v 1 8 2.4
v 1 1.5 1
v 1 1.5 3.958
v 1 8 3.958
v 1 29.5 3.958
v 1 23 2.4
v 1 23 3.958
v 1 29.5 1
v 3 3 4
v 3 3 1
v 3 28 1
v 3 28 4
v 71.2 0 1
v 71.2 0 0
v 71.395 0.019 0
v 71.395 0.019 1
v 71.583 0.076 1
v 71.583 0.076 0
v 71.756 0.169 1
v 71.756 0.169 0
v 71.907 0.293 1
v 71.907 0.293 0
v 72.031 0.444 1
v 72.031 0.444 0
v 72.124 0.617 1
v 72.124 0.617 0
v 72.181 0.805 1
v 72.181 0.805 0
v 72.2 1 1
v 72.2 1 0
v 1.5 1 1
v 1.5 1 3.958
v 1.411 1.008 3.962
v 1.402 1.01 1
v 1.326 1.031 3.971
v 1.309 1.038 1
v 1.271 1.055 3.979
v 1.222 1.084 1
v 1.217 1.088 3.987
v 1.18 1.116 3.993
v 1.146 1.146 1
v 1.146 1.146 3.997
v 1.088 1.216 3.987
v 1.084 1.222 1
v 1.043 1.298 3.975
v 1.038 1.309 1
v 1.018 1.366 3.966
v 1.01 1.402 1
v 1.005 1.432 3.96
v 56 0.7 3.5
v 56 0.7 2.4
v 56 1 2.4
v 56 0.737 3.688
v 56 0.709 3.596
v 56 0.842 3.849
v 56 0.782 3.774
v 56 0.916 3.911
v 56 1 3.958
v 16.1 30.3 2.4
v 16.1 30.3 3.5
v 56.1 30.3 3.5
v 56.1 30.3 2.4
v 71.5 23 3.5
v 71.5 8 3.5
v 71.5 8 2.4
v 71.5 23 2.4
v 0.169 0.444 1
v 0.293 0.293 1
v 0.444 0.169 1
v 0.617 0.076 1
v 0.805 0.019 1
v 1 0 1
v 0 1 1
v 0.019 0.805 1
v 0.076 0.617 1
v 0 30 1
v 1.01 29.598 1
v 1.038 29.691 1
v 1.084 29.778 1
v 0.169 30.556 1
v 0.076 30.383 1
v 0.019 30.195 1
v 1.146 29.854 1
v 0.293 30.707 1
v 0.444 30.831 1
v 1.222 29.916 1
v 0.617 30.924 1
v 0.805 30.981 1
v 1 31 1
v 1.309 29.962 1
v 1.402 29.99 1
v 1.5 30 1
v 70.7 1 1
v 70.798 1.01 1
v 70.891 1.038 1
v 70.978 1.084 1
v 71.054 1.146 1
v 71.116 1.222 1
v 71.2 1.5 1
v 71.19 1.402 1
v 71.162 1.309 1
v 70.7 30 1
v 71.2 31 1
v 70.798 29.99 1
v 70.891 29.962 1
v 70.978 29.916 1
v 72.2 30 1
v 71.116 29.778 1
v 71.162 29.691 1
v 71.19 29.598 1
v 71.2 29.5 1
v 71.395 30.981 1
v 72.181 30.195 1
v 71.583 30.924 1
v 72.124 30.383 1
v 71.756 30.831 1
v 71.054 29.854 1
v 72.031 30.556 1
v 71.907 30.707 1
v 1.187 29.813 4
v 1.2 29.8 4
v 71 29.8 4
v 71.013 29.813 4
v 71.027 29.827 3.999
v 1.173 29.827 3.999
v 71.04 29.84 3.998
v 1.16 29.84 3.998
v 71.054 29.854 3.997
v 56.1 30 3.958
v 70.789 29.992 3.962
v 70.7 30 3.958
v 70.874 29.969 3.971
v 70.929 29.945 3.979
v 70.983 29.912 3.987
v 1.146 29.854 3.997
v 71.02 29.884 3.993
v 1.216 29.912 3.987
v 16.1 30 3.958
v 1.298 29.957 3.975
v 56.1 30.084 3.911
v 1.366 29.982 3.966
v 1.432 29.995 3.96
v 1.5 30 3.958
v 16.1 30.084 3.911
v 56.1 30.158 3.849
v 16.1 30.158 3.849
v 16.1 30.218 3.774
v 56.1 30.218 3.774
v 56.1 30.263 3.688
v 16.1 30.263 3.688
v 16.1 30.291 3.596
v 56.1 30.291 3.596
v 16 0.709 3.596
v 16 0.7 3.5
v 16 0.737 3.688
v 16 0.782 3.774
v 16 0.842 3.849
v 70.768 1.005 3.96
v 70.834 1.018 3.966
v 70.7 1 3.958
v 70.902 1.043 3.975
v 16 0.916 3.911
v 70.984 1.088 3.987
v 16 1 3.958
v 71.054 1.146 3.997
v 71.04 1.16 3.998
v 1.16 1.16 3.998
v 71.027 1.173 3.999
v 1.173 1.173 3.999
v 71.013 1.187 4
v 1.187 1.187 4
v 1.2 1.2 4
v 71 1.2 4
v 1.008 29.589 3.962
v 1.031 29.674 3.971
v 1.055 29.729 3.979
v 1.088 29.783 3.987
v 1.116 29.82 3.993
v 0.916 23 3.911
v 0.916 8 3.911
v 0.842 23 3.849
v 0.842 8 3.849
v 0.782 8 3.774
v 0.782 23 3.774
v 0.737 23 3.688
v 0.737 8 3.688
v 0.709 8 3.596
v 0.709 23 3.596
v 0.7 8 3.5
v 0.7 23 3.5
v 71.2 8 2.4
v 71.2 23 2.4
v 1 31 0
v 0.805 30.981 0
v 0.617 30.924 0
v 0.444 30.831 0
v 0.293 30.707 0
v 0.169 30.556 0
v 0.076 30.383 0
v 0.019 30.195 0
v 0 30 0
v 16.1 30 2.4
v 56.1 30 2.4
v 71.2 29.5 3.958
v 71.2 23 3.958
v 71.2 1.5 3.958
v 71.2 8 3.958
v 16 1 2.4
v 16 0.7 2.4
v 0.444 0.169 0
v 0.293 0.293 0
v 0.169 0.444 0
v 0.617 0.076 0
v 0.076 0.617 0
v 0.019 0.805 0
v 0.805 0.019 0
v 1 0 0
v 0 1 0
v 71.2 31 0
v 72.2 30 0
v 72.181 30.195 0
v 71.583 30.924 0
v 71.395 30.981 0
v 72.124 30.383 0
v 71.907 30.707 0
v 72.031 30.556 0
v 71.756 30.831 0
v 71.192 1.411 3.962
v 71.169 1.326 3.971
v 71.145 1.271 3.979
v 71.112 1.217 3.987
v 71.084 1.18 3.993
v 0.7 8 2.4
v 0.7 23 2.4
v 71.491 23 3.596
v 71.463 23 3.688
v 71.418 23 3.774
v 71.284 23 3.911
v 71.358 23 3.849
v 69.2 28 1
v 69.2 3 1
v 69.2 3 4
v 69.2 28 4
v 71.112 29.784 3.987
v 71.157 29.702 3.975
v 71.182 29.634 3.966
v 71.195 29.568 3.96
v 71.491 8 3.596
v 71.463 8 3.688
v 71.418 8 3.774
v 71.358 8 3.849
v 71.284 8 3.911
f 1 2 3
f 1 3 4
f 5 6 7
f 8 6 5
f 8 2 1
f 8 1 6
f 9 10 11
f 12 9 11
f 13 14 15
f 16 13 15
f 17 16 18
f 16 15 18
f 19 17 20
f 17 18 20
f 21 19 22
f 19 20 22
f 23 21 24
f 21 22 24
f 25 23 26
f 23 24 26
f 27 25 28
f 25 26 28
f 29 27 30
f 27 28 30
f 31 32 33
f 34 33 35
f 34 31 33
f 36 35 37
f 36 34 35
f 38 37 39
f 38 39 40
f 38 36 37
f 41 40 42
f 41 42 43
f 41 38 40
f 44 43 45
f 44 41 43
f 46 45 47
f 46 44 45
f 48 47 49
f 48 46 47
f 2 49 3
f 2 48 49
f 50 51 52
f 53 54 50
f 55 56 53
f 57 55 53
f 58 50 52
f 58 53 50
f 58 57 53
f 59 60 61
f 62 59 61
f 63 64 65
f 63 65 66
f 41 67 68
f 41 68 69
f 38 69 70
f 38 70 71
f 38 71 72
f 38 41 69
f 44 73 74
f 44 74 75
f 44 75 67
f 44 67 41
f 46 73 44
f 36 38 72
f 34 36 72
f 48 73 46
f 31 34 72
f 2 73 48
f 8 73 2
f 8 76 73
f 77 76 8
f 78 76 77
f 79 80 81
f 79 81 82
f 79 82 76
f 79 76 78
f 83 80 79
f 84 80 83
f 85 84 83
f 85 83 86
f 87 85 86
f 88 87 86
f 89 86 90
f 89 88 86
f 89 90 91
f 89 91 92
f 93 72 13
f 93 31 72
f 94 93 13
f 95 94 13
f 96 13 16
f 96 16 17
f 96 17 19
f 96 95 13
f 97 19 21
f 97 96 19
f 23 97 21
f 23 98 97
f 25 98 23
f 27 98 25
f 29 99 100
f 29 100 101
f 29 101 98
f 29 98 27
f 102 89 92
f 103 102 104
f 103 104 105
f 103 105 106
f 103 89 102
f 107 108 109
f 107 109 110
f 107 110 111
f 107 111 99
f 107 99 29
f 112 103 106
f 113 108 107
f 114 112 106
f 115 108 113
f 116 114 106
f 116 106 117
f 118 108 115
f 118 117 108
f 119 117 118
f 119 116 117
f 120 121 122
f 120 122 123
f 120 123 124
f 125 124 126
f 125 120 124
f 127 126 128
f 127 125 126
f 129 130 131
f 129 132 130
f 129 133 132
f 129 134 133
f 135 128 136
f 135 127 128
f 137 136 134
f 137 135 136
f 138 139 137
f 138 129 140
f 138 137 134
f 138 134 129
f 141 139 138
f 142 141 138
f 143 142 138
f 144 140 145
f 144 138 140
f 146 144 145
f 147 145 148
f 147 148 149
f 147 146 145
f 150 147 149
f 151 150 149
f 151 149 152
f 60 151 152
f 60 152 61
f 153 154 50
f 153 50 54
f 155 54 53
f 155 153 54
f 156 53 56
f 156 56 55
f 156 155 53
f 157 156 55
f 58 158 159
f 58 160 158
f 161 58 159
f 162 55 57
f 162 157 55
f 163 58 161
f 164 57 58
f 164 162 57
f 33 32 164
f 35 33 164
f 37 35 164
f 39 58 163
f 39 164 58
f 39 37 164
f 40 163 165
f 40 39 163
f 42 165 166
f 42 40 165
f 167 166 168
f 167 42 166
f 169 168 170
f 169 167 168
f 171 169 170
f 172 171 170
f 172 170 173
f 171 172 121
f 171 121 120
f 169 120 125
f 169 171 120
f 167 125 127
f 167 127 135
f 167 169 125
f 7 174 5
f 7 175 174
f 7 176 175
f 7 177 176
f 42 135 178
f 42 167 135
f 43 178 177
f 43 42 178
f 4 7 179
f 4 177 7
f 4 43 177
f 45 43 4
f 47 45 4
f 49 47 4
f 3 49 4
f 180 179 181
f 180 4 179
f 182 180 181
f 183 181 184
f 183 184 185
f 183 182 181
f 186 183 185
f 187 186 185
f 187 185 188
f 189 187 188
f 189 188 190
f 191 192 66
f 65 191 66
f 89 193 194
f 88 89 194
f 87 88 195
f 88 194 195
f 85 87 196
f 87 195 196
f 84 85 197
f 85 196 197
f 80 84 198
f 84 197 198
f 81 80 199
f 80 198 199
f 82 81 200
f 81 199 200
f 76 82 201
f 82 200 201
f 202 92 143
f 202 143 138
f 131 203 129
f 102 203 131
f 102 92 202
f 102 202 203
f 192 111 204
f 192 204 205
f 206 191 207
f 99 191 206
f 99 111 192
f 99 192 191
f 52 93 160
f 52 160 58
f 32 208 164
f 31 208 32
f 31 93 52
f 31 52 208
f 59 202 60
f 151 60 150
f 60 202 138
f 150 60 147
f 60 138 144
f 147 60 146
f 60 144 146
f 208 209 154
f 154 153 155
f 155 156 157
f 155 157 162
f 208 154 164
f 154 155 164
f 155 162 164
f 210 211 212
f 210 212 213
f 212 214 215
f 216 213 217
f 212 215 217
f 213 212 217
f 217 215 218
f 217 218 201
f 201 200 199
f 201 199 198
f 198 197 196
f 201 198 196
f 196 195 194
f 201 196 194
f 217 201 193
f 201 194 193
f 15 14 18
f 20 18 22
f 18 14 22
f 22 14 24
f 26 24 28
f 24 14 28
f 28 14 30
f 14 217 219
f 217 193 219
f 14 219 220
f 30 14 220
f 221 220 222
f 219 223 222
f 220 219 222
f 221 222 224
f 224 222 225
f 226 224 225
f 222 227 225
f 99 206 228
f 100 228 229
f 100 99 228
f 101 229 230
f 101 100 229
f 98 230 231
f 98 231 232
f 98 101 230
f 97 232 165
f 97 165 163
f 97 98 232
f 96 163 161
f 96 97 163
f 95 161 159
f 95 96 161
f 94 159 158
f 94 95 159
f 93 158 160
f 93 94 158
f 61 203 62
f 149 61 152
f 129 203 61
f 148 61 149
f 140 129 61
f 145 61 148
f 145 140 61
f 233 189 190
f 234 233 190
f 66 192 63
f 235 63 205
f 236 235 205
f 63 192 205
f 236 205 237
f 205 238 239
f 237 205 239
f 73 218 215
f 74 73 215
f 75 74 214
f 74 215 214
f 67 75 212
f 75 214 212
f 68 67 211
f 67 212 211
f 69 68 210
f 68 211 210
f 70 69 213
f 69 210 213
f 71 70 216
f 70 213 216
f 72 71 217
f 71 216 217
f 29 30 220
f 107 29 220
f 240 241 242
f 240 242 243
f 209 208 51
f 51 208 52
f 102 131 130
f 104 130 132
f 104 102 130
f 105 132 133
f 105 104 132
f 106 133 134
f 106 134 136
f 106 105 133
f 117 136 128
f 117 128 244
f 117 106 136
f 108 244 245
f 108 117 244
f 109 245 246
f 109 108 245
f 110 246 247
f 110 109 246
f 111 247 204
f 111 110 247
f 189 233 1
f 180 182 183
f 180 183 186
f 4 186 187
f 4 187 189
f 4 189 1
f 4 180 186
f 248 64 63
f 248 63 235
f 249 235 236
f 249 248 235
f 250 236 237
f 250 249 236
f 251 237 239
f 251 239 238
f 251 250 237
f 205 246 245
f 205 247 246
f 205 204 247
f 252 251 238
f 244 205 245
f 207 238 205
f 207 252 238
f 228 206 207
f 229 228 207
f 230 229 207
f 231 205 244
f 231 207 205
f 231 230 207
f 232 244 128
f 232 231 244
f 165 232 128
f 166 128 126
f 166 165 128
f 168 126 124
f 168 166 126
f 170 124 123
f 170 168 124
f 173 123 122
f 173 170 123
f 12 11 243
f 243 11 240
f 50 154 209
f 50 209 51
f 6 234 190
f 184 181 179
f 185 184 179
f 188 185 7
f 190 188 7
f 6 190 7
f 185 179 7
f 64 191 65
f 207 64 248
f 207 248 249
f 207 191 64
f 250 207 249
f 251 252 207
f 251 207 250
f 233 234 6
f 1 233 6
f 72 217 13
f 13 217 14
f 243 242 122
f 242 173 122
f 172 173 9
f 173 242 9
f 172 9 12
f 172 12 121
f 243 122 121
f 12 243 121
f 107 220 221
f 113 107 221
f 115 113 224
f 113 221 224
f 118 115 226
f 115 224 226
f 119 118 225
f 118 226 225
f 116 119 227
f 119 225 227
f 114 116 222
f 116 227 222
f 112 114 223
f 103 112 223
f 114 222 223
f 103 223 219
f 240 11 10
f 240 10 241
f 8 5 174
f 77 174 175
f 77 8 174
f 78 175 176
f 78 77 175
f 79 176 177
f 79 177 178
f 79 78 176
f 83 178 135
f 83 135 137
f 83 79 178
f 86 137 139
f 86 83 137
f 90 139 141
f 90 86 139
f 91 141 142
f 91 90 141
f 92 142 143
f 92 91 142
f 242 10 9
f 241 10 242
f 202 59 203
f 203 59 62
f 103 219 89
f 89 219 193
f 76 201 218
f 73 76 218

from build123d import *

# Parameters (mm, degrees)
BOSS_EXTRUDE1_DEPTH = 1
SKETCH2_W           = 66.2
SKETCH2_H           = 25
BOSS_EXTRUDE2_DEPTH = 3
SKETCH3_W           = 0.3
SKETCH3_H           = 15
SKETCH3_W_2         = 40
SKETCH3_H_2         = 0.3
BOSS_EXTRUDE3_DEPTH = 1.6
FILLET1_START       = 1
FILLET1_DEPTH       = 70.2
FILLET1_2_DEPTH     = 31


with BuildPart() as part:
    # Sketch1 → Boss-Extrude1 (new body)
    with BuildSketch(Plane.XY):
        with BuildLine():
            Line((1, 0), (71.2, 0))
            ThreePointArc((71.2, 0), (71.907106781, 0.292893219), (72.2, 1))
            Line((72.2, 1), (72.2, 30))
            ThreePointArc((72.2, 30), (71.907106781, 30.707106781), (71.2, 31))
            Line((71.2, 31), (1, 31))
            ThreePointArc((1, 31), (0.292893219, 30.707106781), (0, 30))
            Line((0, 30), (0, 1))
            ThreePointArc((0, 1), (0.292893219, 0.292893219), (1, 0))
        make_face()
    extrude(amount=BOSS_EXTRUDE1_DEPTH)

    # Sketch2 → Boss-Extrude2 (add)
    with BuildSketch(Plane.XY.offset(1)):
        with BuildLine():
            Line((1.5, 30), (70.7, 30))
            ThreePointArc((70.7, 30), (71.053553391, 29.853553391), (71.2, 29.5))
            Line((71.2, 29.5), (71.2, 1.5))
            ThreePointArc((71.2, 1.5), (71.053553391, 1.146446609), (70.7, 1))
            Line((70.7, 1), (1.5, 1))
            ThreePointArc((1.5, 1), (1.146446609, 1.146446609), (1, 1.5))
            Line((1, 1.5), (1, 29.5))
            ThreePointArc((1, 29.5), (1.146446609, 29.853553391), (1.5, 30))
        make_face()
        with Locations((36.1, 15.5)):
            Rectangle(SKETCH2_W, SKETCH2_H, mode=Mode.SUBTRACT)
    extrude(amount=BOSS_EXTRUDE2_DEPTH)

    # Sketch3 → Boss-Extrude3 (add)
    with BuildSketch(Plane.XY.offset(4)):
        with Locations((71.35, 15.5)):
            Rectangle(SKETCH3_W, SKETCH3_H)
        with Locations((36.1, 30.15)):
            Rectangle(SKETCH3_W_2, SKETCH3_H_2)
        with Locations((0.85, 15.5)):
            Rectangle(SKETCH3_W, SKETCH3_H)
        with Locations((36, 0.85)):
            Rectangle(SKETCH3_W_2, SKETCH3_H_2)
    extrude(amount=-BOSS_EXTRUDE3_DEPTH)

    # Fillet1: read off the stored shape, not the designer's step
    # Fillet1 outline → Fillet1 (cut)
    with BuildSketch(Plane.YZ.offset(FILLET1_START)):
        with BuildLine():
            ThreePointArc((29.8, 4), (30.153553391, 3.853553391), (30.3, 3.5))
            Line((30.3, 3.5), (30.3, 4))
            Line((30.3, 4), (29.8, 4))
        make_face()
        with BuildLine():
            Line((1.2, 4), (0.7, 4))
            Line((0.7, 4), (0.7, 3.5))
            ThreePointArc((0.7, 3.5), (0.846446609, 3.853553391), (1.2, 4))
        make_face()
    extrude(amount=FILLET1_DEPTH, mode=Mode.SUBTRACT)

    # Fillet1 2 outline → Fillet1 2 (cut)
    with BuildSketch(Plane(origin=(0, 0, 0), x_dir=(1, 0, 0), z_dir=(0, 1, 0))):
        with BuildLine():
            ThreePointArc((1.2, -4), (0.846446609, -3.853553391), (0.7, -3.5))
            Line((0.7, -3.5), (0.7, -4))
            Line((0.7, -4), (1.2, -4))
        make_face()
        with BuildLine():
            Line((71, -4), (71.5, -4))
            Line((71.5, -4), (71.5, -3.5))
            ThreePointArc((71.5, -3.5), (71.353553391, -3.853553391), (71, -4))
        make_face()
    extrude(amount=FILLET1_2_DEPTH, mode=Mode.SUBTRACT)


solid = part.part
